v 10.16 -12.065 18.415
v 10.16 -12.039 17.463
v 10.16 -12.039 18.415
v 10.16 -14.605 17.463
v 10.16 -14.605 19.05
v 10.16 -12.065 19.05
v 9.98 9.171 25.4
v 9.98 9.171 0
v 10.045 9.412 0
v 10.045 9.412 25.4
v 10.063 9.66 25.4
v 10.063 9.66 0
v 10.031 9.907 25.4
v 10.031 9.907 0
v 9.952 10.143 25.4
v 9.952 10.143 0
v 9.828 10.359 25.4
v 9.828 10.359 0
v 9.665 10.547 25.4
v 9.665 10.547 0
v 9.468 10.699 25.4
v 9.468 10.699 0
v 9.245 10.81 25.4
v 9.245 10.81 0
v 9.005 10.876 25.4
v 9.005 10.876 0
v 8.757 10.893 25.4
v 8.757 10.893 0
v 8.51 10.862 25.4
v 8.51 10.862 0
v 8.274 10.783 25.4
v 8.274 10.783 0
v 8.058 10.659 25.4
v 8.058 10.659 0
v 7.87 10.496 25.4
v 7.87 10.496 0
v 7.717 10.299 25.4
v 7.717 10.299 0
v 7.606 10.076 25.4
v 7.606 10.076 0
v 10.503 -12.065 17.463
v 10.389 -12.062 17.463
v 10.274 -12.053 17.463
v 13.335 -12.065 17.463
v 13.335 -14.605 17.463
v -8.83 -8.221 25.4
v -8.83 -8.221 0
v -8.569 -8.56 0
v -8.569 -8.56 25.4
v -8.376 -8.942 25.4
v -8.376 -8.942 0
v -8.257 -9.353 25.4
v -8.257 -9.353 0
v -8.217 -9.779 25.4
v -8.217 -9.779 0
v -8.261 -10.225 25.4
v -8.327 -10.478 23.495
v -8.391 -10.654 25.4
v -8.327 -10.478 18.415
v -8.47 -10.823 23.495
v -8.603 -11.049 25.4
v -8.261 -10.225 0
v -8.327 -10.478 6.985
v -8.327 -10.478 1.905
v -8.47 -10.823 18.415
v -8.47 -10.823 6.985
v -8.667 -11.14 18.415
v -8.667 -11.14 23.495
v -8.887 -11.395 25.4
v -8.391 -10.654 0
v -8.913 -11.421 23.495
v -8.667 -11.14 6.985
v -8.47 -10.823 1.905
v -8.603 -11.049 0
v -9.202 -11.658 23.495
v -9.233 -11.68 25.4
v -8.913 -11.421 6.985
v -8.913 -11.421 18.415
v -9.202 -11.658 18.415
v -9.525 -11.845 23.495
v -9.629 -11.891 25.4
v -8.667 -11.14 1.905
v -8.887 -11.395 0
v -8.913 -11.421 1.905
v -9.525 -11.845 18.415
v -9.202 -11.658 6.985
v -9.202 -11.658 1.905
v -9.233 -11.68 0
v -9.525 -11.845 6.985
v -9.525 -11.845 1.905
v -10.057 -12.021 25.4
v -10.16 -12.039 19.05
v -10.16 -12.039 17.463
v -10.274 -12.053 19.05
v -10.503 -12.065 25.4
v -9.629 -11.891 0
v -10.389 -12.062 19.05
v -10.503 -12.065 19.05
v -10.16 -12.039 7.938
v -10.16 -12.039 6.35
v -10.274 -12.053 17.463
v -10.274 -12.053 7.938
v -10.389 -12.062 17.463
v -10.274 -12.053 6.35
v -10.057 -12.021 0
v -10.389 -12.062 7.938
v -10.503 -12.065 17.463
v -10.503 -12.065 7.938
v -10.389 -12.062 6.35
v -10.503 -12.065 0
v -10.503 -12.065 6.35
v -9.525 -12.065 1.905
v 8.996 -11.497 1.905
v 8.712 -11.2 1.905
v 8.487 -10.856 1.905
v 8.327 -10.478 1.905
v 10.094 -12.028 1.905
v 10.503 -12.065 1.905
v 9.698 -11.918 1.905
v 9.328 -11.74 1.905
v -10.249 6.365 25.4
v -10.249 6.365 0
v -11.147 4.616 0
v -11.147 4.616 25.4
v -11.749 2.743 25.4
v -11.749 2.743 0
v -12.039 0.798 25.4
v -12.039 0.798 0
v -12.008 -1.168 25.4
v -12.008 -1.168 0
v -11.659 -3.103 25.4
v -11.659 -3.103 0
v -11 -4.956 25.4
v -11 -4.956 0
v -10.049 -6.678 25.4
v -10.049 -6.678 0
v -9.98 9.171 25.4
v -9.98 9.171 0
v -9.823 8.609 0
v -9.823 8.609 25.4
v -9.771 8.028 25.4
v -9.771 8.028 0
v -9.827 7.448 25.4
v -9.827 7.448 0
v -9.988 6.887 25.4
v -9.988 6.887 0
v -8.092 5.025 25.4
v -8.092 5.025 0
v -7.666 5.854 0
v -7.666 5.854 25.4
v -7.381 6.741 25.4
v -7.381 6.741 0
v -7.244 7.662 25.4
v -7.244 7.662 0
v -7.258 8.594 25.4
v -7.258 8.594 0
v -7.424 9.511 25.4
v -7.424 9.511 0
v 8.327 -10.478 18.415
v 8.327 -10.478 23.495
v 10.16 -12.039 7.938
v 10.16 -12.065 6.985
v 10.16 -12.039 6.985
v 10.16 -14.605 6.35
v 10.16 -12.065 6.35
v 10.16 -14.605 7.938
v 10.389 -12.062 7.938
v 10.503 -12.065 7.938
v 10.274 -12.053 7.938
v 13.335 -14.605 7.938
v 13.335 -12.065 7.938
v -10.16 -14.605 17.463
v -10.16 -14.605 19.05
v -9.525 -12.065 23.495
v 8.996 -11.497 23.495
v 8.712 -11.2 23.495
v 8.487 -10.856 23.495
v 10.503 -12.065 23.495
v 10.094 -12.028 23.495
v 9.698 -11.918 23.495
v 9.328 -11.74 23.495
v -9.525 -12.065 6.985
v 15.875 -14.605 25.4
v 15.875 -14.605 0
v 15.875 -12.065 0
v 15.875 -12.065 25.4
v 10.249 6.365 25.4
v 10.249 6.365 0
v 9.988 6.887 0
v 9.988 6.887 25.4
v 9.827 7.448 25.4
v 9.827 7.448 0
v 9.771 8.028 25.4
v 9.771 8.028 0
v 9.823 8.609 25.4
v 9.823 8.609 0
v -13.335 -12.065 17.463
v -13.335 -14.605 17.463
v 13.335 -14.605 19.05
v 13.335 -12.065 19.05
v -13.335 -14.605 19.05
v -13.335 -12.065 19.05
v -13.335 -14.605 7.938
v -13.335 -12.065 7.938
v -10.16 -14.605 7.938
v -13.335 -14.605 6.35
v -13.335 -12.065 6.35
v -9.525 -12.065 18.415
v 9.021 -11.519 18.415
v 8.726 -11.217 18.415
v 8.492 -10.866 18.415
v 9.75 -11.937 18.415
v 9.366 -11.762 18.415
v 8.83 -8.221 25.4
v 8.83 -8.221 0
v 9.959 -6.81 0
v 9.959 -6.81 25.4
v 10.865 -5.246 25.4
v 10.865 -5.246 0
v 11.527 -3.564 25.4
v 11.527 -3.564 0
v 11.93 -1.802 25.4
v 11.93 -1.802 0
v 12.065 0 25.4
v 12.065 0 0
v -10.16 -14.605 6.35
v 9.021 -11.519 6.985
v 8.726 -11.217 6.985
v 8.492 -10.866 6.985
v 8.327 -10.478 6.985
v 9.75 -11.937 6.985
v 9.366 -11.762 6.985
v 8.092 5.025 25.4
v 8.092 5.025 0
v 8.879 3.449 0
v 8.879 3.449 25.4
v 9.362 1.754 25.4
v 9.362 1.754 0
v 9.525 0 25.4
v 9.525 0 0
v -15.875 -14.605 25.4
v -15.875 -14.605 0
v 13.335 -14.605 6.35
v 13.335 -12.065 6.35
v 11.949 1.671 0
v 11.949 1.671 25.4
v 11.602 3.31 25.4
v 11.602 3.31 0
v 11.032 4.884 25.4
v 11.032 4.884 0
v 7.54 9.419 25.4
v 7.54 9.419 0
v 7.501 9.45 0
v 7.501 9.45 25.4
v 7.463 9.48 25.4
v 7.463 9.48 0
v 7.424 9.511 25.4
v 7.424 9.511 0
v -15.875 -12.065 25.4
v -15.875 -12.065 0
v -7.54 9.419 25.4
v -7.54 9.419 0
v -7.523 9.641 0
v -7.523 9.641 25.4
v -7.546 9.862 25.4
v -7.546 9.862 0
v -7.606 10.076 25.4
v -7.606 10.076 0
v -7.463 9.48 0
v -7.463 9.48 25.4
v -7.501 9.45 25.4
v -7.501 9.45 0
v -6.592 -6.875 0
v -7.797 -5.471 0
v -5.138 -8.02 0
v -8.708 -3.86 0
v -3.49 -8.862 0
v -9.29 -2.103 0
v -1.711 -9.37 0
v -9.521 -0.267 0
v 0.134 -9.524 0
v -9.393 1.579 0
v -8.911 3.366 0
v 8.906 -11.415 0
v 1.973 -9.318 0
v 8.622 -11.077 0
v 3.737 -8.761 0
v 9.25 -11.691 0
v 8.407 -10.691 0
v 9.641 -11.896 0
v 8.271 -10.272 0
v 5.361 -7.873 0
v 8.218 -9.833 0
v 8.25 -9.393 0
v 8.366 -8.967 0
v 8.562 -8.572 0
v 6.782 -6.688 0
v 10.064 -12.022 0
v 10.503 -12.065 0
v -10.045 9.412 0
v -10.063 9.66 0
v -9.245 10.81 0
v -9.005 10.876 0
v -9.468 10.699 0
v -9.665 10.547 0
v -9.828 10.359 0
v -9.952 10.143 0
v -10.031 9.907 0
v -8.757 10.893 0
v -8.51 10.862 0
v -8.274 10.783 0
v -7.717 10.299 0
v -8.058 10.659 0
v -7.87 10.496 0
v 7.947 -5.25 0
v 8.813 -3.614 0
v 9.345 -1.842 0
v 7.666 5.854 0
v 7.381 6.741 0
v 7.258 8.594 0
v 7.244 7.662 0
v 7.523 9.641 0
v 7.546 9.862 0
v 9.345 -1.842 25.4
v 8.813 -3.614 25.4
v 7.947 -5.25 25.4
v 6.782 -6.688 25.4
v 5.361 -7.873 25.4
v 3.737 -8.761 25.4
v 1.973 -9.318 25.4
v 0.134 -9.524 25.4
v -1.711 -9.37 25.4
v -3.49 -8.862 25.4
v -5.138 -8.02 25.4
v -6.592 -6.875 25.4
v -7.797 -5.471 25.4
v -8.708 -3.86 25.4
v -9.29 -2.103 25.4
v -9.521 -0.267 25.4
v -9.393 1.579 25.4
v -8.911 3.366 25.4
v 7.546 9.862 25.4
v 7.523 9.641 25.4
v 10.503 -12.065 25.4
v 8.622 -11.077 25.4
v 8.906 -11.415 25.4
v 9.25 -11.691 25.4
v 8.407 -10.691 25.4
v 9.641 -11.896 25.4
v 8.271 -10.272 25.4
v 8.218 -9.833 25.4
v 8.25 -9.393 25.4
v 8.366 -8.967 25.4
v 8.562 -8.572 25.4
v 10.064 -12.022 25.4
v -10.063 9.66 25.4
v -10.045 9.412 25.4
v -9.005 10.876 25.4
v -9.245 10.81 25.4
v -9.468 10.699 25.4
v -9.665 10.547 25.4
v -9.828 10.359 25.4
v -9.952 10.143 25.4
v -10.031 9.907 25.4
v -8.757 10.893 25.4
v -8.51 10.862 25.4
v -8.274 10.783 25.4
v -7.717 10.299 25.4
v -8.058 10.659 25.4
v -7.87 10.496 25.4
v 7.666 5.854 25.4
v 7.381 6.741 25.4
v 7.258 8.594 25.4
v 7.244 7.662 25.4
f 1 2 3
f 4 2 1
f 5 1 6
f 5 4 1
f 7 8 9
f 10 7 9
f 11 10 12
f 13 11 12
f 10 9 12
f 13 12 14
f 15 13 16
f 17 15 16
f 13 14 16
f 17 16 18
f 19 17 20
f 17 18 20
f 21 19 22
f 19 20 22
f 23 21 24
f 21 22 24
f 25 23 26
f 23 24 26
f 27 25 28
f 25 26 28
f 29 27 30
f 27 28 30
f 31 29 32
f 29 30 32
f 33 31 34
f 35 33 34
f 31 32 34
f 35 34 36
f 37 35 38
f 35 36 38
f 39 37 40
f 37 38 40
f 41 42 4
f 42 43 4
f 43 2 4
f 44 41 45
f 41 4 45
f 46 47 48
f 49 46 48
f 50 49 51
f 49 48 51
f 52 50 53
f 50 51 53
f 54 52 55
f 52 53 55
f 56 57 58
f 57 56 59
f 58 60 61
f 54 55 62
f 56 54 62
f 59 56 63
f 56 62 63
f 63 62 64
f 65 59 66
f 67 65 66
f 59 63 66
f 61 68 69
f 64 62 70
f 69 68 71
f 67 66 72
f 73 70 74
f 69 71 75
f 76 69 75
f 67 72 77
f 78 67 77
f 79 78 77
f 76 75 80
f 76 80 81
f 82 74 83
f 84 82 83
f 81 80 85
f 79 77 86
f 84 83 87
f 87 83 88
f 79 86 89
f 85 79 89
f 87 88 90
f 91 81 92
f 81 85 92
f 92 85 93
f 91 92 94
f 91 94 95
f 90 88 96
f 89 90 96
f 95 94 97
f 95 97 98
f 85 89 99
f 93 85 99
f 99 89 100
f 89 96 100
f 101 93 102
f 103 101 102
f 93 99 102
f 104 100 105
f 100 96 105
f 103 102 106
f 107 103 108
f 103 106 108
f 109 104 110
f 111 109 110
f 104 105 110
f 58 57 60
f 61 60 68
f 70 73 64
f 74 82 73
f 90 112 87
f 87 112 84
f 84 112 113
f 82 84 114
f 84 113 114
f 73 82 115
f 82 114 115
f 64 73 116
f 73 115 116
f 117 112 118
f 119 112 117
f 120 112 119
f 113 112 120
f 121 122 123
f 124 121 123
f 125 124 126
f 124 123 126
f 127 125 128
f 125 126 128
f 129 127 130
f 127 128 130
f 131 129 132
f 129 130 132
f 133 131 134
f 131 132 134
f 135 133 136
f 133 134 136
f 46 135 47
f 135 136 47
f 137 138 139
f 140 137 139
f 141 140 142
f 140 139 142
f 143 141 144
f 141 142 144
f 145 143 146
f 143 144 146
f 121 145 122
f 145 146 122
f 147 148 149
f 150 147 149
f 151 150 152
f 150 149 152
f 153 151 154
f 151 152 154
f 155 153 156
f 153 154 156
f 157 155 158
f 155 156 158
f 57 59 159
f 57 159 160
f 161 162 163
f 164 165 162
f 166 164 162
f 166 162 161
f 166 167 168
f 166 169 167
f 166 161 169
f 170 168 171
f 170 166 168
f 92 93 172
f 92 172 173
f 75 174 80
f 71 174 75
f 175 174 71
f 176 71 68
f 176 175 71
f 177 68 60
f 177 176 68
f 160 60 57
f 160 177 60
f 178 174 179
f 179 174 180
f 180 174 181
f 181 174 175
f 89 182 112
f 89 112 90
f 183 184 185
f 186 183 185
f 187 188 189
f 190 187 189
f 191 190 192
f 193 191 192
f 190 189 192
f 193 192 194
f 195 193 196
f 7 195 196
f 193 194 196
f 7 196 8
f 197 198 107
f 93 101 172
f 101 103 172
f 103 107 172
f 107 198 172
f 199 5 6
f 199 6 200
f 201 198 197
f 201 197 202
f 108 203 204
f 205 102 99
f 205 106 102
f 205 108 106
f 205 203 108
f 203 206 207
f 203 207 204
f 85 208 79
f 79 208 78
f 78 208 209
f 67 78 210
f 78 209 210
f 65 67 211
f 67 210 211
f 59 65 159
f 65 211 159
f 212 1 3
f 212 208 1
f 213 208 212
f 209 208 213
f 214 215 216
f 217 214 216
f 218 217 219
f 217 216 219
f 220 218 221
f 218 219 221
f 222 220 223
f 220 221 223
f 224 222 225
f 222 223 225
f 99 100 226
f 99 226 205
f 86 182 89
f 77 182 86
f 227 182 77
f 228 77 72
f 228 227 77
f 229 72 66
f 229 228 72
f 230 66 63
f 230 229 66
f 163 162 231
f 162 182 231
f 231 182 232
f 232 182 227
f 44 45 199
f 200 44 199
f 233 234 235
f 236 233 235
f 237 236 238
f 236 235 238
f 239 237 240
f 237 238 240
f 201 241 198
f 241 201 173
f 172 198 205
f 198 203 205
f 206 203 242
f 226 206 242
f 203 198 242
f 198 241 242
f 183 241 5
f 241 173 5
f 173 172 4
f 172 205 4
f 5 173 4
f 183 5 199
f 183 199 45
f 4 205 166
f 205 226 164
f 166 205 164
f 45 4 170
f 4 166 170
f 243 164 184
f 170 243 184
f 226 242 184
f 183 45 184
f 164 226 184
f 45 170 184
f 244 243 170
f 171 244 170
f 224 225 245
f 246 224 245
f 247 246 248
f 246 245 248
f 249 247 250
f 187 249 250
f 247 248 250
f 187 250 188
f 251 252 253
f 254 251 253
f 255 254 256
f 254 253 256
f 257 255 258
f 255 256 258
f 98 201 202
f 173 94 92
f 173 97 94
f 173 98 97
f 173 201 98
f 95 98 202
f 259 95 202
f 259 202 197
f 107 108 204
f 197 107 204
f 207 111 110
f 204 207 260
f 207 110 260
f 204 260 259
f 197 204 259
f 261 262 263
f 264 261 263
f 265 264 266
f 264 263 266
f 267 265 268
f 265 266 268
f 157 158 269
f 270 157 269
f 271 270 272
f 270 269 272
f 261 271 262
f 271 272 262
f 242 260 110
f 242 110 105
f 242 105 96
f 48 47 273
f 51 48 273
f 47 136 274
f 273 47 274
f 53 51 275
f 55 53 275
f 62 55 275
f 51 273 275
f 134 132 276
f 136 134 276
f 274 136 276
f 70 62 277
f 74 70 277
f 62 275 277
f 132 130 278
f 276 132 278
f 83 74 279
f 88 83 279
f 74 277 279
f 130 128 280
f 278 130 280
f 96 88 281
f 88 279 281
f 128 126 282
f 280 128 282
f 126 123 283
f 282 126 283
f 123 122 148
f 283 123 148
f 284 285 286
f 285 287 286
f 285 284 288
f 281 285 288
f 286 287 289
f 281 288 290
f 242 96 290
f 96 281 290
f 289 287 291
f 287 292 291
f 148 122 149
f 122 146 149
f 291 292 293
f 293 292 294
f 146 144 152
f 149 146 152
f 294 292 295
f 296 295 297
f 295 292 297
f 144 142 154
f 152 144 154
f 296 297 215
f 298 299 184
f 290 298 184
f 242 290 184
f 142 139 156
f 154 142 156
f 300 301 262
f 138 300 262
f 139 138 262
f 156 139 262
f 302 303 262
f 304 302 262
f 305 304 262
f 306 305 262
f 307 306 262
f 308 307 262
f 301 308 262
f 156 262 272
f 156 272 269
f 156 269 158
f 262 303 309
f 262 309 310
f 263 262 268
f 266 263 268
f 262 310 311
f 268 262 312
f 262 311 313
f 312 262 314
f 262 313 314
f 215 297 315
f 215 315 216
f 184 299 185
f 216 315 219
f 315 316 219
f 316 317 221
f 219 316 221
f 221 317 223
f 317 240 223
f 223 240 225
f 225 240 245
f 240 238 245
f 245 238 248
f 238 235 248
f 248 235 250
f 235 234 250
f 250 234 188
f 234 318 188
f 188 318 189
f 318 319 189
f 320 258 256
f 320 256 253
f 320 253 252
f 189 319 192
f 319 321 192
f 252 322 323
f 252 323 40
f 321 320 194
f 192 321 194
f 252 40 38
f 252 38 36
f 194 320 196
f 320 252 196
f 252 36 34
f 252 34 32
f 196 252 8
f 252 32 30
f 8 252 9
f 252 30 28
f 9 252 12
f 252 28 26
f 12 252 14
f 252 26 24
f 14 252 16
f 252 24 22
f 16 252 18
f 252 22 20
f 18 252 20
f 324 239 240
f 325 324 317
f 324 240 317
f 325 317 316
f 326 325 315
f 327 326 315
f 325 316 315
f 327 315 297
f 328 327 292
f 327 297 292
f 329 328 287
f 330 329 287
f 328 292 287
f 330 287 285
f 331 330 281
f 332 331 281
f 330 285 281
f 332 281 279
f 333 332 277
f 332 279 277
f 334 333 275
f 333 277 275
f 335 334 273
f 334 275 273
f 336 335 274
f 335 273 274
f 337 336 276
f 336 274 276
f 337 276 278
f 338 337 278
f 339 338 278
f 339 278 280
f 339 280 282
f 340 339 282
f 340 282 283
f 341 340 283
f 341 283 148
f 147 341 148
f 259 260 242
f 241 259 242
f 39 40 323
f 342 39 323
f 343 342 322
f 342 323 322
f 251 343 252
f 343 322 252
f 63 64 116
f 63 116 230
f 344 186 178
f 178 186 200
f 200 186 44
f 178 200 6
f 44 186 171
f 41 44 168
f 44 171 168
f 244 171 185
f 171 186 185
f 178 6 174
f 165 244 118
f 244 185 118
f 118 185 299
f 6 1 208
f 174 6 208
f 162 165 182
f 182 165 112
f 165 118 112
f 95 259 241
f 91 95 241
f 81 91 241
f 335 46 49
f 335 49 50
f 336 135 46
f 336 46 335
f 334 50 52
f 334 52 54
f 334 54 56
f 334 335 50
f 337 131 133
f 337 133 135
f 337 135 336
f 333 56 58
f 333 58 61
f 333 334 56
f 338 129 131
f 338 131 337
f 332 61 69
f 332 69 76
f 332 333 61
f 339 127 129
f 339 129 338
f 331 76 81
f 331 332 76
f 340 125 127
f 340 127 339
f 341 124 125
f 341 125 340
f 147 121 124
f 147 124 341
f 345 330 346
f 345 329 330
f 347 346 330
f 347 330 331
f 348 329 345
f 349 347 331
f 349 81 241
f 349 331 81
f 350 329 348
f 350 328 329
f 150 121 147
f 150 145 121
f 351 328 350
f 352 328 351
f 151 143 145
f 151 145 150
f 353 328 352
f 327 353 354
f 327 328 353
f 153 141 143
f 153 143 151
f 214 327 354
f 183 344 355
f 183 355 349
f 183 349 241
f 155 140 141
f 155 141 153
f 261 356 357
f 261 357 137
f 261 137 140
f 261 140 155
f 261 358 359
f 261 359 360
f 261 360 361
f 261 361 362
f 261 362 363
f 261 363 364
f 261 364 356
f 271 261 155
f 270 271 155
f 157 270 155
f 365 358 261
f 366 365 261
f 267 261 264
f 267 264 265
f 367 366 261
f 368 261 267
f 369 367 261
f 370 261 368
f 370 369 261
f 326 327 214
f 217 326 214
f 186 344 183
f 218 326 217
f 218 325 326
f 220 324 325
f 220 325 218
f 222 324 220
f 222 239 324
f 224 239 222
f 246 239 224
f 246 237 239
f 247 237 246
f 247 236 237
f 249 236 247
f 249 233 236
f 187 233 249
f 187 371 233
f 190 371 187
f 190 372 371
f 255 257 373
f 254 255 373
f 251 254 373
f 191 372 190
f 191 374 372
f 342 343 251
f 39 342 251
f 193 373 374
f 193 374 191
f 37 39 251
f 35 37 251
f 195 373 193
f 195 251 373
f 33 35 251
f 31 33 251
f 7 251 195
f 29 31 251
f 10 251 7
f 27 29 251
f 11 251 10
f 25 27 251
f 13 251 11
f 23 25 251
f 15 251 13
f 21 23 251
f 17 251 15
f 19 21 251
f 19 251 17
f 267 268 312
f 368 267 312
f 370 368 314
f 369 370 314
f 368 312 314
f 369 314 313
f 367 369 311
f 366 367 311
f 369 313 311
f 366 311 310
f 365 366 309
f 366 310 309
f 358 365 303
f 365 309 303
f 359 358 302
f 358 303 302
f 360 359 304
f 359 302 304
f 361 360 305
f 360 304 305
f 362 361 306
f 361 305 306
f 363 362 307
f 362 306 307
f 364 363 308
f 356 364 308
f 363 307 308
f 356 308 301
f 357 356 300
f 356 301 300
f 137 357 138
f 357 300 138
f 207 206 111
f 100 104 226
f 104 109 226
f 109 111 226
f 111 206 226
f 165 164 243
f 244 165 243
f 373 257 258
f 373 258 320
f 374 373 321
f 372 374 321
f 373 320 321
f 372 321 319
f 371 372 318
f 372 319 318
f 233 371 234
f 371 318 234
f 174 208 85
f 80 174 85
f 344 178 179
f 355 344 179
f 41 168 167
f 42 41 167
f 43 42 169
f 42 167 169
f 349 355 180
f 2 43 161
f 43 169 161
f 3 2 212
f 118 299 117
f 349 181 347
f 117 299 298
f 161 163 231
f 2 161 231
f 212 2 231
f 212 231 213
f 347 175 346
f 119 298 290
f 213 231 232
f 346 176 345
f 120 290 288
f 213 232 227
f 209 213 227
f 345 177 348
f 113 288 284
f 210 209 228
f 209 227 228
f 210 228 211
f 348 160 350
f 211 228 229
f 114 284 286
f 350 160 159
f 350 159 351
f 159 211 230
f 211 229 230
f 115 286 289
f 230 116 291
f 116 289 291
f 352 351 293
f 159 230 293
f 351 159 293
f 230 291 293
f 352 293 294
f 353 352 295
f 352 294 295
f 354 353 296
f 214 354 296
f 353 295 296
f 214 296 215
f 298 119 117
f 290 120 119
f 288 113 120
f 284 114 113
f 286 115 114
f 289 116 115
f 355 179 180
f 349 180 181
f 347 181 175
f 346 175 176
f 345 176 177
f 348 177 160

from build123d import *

# Parameters (mm, degrees)
F1_DEPTH = 25.4
F2_W     = 3.175
F2_H     = 1.5875
F3_DEPTH = 2.566946587
F4_W     = 1.5875
F4_H     = 5.08
F5_DEPTH = 25.4


with BuildPart() as f1:
    # F0 (on Top) → F1 (new body)
    with BuildSketch(Plane.XY):
        with BuildLine():
            ThreePointArc((10.5034451491, -12.065), (8.4074088227, -10.6913747686), (8.8303299626, -8.2212832181))
            ThreePointArc((8.8303299626, -8.2212832181), (4.8153111516, -11.0624140003), (0, -12.065))
            Line((0, -12.065), (10.5034451491, -12.065))
        make_face()
        Polygon((10.5034451491, -12.065), (0, -12.065), (-10.5034451491, -12.065), (-15.875, -12.065), (-15.875, -14.605), (0, -14.605), (15.875, -14.605), (15.875, -12.065), align=None)
        with BuildLine():
            ThreePointArc((0, -12.065), (-4.8153111516, -11.0624140003), (-8.8303299626, -8.2212832181))
            ThreePointArc((-8.8303299626, -8.2212832181), (-8.3761772632, -8.9420248858), (-8.2174451491, -9.779))
            ThreePointArc((-8.2174451491, -9.779), (-8.8869990473, -11.3954461018), (-10.5034451491, -12.065))
            Line((-10.5034451491, -12.065), (0, -12.065))
        make_face()
        with BuildLine():
            ThreePointArc((8.0915303411, 5.0252126064), (9.1596247603, 2.6128335673), (9.525, 0))
            ThreePointArc((9.525, 0), (-2.6128335673, -9.1596247603), (-8.0915303411, 5.0252126064))
            ThreePointArc((-8.0915303411, 5.0252126064), (-7.2937412546, 7.1988383693), (-7.4238053541, 9.5105908894))
            ThreePointArc((-7.4238053541, 9.5105908894), (-7.4818724406, 9.4649780656), (-7.539659283, 9.4190107175))
            ThreePointArc((-7.539659283, 9.4190107175), (-9.0245693038, 8.0075822743), (-10.2492717654, 6.3652693014))
            ThreePointArc((-10.2492717654, 6.3652693014), (-12.0083170813, -1.1681377807), (-8.8303299626, -8.2212832181))
            ThreePointArc((-8.8303299626, -8.2212832181), (-4.8153111516, -11.0624140003), (0, -12.065))
            ThreePointArc((0, -12.065), (4.8153111516, -11.0624140003), (8.8303299626, -8.2212832181))
            ThreePointArc((8.8303299626, -8.2212832181), (11.2272471247, -4.4173687871), (12.065, 0))
            ThreePointArc((12.065, 0), (11.602191363, 3.3095891853), (10.2492717654, 6.3652693014))
            ThreePointArc((10.2492717654, 6.3652693014), (9.0245693038, 8.0075822743), (7.539659283, 9.4190107175))
            ThreePointArc((7.539659283, 9.4190107175), (7.4818724406, 9.4649780656), (7.4238053541, 9.5105908894))
            ThreePointArc((7.4238053541, 9.5105908894), (7.2937412546, 7.1988383693), (8.0915303411, 5.0252126064))
        make_face()
        with BuildLine():
            ThreePointArc((7.6063568635, 10.0761804943), (7.5295347203, 9.7520078104), (7.539659283, 9.4190107175))
            ThreePointArc((7.539659283, 9.4190107175), (9.0245693038, 8.0075822743), (10.2492717654, 6.3652693014))
            ThreePointArc((10.2492717654, 6.3652693014), (9.7859952946, 7.736761108), (9.9797309445, 9.1713625725))
            ThreePointArc((9.9797309445, 9.1713625725), (9.2454528649, 10.8104585739), (7.6063568635, 10.0761804943))
        make_face()
        with BuildLine():
            ThreePointArc((-10.2492717654, 6.3652693014), (-9.0245693038, 8.0075822743), (-7.539659283, 9.4190107175))
            ThreePointArc((-7.539659283, 9.4190107175), (-7.5295347203, 9.7520078104), (-7.6063568635, 10.0761804943))
            ThreePointArc((-7.6063568635, 10.0761804943), (-9.2454528649, 10.8104585739), (-9.9797309445, 9.1713625725))
            ThreePointArc((-9.9797309445, 9.1713625725), (-9.7859952946, 7.736761108), (-10.2492717654, 6.3652693014))
        make_face()
    extrude(amount=F1_DEPTH)

    # F2 (on face) → F3 (cut, through all)
    with BuildSketch(Plane.XZ.offset(14.605)):
        with Locations((-11.7475, 18.25625)):
            Rectangle(F2_W, F2_H)
        with Locations((11.7475, 18.25625)):
            Rectangle(F2_W, F2_H)
        with Locations((11.7475, 7.14375)):
            Rectangle(F2_W, F2_H)
        with Locations((-11.7475, 7.14375)):
            Rectangle(F2_W, F2_H)
    extrude(amount=-F3_DEPTH, mode=Mode.SUBTRACT)

    # F4 (on face) → F5 (cut)
    with BuildSketch(Plane.YZ.offset(15.875)):
        with Locations((-11.27125, 4.445)):
            Rectangle(F4_W, F4_H)
        with Locations((-11.27125, 20.955)):
            Rectangle(F4_W, F4_H)
    extrude(amount=-F5_DEPTH, mode=Mode.SUBTRACT)


solid = f1.part
